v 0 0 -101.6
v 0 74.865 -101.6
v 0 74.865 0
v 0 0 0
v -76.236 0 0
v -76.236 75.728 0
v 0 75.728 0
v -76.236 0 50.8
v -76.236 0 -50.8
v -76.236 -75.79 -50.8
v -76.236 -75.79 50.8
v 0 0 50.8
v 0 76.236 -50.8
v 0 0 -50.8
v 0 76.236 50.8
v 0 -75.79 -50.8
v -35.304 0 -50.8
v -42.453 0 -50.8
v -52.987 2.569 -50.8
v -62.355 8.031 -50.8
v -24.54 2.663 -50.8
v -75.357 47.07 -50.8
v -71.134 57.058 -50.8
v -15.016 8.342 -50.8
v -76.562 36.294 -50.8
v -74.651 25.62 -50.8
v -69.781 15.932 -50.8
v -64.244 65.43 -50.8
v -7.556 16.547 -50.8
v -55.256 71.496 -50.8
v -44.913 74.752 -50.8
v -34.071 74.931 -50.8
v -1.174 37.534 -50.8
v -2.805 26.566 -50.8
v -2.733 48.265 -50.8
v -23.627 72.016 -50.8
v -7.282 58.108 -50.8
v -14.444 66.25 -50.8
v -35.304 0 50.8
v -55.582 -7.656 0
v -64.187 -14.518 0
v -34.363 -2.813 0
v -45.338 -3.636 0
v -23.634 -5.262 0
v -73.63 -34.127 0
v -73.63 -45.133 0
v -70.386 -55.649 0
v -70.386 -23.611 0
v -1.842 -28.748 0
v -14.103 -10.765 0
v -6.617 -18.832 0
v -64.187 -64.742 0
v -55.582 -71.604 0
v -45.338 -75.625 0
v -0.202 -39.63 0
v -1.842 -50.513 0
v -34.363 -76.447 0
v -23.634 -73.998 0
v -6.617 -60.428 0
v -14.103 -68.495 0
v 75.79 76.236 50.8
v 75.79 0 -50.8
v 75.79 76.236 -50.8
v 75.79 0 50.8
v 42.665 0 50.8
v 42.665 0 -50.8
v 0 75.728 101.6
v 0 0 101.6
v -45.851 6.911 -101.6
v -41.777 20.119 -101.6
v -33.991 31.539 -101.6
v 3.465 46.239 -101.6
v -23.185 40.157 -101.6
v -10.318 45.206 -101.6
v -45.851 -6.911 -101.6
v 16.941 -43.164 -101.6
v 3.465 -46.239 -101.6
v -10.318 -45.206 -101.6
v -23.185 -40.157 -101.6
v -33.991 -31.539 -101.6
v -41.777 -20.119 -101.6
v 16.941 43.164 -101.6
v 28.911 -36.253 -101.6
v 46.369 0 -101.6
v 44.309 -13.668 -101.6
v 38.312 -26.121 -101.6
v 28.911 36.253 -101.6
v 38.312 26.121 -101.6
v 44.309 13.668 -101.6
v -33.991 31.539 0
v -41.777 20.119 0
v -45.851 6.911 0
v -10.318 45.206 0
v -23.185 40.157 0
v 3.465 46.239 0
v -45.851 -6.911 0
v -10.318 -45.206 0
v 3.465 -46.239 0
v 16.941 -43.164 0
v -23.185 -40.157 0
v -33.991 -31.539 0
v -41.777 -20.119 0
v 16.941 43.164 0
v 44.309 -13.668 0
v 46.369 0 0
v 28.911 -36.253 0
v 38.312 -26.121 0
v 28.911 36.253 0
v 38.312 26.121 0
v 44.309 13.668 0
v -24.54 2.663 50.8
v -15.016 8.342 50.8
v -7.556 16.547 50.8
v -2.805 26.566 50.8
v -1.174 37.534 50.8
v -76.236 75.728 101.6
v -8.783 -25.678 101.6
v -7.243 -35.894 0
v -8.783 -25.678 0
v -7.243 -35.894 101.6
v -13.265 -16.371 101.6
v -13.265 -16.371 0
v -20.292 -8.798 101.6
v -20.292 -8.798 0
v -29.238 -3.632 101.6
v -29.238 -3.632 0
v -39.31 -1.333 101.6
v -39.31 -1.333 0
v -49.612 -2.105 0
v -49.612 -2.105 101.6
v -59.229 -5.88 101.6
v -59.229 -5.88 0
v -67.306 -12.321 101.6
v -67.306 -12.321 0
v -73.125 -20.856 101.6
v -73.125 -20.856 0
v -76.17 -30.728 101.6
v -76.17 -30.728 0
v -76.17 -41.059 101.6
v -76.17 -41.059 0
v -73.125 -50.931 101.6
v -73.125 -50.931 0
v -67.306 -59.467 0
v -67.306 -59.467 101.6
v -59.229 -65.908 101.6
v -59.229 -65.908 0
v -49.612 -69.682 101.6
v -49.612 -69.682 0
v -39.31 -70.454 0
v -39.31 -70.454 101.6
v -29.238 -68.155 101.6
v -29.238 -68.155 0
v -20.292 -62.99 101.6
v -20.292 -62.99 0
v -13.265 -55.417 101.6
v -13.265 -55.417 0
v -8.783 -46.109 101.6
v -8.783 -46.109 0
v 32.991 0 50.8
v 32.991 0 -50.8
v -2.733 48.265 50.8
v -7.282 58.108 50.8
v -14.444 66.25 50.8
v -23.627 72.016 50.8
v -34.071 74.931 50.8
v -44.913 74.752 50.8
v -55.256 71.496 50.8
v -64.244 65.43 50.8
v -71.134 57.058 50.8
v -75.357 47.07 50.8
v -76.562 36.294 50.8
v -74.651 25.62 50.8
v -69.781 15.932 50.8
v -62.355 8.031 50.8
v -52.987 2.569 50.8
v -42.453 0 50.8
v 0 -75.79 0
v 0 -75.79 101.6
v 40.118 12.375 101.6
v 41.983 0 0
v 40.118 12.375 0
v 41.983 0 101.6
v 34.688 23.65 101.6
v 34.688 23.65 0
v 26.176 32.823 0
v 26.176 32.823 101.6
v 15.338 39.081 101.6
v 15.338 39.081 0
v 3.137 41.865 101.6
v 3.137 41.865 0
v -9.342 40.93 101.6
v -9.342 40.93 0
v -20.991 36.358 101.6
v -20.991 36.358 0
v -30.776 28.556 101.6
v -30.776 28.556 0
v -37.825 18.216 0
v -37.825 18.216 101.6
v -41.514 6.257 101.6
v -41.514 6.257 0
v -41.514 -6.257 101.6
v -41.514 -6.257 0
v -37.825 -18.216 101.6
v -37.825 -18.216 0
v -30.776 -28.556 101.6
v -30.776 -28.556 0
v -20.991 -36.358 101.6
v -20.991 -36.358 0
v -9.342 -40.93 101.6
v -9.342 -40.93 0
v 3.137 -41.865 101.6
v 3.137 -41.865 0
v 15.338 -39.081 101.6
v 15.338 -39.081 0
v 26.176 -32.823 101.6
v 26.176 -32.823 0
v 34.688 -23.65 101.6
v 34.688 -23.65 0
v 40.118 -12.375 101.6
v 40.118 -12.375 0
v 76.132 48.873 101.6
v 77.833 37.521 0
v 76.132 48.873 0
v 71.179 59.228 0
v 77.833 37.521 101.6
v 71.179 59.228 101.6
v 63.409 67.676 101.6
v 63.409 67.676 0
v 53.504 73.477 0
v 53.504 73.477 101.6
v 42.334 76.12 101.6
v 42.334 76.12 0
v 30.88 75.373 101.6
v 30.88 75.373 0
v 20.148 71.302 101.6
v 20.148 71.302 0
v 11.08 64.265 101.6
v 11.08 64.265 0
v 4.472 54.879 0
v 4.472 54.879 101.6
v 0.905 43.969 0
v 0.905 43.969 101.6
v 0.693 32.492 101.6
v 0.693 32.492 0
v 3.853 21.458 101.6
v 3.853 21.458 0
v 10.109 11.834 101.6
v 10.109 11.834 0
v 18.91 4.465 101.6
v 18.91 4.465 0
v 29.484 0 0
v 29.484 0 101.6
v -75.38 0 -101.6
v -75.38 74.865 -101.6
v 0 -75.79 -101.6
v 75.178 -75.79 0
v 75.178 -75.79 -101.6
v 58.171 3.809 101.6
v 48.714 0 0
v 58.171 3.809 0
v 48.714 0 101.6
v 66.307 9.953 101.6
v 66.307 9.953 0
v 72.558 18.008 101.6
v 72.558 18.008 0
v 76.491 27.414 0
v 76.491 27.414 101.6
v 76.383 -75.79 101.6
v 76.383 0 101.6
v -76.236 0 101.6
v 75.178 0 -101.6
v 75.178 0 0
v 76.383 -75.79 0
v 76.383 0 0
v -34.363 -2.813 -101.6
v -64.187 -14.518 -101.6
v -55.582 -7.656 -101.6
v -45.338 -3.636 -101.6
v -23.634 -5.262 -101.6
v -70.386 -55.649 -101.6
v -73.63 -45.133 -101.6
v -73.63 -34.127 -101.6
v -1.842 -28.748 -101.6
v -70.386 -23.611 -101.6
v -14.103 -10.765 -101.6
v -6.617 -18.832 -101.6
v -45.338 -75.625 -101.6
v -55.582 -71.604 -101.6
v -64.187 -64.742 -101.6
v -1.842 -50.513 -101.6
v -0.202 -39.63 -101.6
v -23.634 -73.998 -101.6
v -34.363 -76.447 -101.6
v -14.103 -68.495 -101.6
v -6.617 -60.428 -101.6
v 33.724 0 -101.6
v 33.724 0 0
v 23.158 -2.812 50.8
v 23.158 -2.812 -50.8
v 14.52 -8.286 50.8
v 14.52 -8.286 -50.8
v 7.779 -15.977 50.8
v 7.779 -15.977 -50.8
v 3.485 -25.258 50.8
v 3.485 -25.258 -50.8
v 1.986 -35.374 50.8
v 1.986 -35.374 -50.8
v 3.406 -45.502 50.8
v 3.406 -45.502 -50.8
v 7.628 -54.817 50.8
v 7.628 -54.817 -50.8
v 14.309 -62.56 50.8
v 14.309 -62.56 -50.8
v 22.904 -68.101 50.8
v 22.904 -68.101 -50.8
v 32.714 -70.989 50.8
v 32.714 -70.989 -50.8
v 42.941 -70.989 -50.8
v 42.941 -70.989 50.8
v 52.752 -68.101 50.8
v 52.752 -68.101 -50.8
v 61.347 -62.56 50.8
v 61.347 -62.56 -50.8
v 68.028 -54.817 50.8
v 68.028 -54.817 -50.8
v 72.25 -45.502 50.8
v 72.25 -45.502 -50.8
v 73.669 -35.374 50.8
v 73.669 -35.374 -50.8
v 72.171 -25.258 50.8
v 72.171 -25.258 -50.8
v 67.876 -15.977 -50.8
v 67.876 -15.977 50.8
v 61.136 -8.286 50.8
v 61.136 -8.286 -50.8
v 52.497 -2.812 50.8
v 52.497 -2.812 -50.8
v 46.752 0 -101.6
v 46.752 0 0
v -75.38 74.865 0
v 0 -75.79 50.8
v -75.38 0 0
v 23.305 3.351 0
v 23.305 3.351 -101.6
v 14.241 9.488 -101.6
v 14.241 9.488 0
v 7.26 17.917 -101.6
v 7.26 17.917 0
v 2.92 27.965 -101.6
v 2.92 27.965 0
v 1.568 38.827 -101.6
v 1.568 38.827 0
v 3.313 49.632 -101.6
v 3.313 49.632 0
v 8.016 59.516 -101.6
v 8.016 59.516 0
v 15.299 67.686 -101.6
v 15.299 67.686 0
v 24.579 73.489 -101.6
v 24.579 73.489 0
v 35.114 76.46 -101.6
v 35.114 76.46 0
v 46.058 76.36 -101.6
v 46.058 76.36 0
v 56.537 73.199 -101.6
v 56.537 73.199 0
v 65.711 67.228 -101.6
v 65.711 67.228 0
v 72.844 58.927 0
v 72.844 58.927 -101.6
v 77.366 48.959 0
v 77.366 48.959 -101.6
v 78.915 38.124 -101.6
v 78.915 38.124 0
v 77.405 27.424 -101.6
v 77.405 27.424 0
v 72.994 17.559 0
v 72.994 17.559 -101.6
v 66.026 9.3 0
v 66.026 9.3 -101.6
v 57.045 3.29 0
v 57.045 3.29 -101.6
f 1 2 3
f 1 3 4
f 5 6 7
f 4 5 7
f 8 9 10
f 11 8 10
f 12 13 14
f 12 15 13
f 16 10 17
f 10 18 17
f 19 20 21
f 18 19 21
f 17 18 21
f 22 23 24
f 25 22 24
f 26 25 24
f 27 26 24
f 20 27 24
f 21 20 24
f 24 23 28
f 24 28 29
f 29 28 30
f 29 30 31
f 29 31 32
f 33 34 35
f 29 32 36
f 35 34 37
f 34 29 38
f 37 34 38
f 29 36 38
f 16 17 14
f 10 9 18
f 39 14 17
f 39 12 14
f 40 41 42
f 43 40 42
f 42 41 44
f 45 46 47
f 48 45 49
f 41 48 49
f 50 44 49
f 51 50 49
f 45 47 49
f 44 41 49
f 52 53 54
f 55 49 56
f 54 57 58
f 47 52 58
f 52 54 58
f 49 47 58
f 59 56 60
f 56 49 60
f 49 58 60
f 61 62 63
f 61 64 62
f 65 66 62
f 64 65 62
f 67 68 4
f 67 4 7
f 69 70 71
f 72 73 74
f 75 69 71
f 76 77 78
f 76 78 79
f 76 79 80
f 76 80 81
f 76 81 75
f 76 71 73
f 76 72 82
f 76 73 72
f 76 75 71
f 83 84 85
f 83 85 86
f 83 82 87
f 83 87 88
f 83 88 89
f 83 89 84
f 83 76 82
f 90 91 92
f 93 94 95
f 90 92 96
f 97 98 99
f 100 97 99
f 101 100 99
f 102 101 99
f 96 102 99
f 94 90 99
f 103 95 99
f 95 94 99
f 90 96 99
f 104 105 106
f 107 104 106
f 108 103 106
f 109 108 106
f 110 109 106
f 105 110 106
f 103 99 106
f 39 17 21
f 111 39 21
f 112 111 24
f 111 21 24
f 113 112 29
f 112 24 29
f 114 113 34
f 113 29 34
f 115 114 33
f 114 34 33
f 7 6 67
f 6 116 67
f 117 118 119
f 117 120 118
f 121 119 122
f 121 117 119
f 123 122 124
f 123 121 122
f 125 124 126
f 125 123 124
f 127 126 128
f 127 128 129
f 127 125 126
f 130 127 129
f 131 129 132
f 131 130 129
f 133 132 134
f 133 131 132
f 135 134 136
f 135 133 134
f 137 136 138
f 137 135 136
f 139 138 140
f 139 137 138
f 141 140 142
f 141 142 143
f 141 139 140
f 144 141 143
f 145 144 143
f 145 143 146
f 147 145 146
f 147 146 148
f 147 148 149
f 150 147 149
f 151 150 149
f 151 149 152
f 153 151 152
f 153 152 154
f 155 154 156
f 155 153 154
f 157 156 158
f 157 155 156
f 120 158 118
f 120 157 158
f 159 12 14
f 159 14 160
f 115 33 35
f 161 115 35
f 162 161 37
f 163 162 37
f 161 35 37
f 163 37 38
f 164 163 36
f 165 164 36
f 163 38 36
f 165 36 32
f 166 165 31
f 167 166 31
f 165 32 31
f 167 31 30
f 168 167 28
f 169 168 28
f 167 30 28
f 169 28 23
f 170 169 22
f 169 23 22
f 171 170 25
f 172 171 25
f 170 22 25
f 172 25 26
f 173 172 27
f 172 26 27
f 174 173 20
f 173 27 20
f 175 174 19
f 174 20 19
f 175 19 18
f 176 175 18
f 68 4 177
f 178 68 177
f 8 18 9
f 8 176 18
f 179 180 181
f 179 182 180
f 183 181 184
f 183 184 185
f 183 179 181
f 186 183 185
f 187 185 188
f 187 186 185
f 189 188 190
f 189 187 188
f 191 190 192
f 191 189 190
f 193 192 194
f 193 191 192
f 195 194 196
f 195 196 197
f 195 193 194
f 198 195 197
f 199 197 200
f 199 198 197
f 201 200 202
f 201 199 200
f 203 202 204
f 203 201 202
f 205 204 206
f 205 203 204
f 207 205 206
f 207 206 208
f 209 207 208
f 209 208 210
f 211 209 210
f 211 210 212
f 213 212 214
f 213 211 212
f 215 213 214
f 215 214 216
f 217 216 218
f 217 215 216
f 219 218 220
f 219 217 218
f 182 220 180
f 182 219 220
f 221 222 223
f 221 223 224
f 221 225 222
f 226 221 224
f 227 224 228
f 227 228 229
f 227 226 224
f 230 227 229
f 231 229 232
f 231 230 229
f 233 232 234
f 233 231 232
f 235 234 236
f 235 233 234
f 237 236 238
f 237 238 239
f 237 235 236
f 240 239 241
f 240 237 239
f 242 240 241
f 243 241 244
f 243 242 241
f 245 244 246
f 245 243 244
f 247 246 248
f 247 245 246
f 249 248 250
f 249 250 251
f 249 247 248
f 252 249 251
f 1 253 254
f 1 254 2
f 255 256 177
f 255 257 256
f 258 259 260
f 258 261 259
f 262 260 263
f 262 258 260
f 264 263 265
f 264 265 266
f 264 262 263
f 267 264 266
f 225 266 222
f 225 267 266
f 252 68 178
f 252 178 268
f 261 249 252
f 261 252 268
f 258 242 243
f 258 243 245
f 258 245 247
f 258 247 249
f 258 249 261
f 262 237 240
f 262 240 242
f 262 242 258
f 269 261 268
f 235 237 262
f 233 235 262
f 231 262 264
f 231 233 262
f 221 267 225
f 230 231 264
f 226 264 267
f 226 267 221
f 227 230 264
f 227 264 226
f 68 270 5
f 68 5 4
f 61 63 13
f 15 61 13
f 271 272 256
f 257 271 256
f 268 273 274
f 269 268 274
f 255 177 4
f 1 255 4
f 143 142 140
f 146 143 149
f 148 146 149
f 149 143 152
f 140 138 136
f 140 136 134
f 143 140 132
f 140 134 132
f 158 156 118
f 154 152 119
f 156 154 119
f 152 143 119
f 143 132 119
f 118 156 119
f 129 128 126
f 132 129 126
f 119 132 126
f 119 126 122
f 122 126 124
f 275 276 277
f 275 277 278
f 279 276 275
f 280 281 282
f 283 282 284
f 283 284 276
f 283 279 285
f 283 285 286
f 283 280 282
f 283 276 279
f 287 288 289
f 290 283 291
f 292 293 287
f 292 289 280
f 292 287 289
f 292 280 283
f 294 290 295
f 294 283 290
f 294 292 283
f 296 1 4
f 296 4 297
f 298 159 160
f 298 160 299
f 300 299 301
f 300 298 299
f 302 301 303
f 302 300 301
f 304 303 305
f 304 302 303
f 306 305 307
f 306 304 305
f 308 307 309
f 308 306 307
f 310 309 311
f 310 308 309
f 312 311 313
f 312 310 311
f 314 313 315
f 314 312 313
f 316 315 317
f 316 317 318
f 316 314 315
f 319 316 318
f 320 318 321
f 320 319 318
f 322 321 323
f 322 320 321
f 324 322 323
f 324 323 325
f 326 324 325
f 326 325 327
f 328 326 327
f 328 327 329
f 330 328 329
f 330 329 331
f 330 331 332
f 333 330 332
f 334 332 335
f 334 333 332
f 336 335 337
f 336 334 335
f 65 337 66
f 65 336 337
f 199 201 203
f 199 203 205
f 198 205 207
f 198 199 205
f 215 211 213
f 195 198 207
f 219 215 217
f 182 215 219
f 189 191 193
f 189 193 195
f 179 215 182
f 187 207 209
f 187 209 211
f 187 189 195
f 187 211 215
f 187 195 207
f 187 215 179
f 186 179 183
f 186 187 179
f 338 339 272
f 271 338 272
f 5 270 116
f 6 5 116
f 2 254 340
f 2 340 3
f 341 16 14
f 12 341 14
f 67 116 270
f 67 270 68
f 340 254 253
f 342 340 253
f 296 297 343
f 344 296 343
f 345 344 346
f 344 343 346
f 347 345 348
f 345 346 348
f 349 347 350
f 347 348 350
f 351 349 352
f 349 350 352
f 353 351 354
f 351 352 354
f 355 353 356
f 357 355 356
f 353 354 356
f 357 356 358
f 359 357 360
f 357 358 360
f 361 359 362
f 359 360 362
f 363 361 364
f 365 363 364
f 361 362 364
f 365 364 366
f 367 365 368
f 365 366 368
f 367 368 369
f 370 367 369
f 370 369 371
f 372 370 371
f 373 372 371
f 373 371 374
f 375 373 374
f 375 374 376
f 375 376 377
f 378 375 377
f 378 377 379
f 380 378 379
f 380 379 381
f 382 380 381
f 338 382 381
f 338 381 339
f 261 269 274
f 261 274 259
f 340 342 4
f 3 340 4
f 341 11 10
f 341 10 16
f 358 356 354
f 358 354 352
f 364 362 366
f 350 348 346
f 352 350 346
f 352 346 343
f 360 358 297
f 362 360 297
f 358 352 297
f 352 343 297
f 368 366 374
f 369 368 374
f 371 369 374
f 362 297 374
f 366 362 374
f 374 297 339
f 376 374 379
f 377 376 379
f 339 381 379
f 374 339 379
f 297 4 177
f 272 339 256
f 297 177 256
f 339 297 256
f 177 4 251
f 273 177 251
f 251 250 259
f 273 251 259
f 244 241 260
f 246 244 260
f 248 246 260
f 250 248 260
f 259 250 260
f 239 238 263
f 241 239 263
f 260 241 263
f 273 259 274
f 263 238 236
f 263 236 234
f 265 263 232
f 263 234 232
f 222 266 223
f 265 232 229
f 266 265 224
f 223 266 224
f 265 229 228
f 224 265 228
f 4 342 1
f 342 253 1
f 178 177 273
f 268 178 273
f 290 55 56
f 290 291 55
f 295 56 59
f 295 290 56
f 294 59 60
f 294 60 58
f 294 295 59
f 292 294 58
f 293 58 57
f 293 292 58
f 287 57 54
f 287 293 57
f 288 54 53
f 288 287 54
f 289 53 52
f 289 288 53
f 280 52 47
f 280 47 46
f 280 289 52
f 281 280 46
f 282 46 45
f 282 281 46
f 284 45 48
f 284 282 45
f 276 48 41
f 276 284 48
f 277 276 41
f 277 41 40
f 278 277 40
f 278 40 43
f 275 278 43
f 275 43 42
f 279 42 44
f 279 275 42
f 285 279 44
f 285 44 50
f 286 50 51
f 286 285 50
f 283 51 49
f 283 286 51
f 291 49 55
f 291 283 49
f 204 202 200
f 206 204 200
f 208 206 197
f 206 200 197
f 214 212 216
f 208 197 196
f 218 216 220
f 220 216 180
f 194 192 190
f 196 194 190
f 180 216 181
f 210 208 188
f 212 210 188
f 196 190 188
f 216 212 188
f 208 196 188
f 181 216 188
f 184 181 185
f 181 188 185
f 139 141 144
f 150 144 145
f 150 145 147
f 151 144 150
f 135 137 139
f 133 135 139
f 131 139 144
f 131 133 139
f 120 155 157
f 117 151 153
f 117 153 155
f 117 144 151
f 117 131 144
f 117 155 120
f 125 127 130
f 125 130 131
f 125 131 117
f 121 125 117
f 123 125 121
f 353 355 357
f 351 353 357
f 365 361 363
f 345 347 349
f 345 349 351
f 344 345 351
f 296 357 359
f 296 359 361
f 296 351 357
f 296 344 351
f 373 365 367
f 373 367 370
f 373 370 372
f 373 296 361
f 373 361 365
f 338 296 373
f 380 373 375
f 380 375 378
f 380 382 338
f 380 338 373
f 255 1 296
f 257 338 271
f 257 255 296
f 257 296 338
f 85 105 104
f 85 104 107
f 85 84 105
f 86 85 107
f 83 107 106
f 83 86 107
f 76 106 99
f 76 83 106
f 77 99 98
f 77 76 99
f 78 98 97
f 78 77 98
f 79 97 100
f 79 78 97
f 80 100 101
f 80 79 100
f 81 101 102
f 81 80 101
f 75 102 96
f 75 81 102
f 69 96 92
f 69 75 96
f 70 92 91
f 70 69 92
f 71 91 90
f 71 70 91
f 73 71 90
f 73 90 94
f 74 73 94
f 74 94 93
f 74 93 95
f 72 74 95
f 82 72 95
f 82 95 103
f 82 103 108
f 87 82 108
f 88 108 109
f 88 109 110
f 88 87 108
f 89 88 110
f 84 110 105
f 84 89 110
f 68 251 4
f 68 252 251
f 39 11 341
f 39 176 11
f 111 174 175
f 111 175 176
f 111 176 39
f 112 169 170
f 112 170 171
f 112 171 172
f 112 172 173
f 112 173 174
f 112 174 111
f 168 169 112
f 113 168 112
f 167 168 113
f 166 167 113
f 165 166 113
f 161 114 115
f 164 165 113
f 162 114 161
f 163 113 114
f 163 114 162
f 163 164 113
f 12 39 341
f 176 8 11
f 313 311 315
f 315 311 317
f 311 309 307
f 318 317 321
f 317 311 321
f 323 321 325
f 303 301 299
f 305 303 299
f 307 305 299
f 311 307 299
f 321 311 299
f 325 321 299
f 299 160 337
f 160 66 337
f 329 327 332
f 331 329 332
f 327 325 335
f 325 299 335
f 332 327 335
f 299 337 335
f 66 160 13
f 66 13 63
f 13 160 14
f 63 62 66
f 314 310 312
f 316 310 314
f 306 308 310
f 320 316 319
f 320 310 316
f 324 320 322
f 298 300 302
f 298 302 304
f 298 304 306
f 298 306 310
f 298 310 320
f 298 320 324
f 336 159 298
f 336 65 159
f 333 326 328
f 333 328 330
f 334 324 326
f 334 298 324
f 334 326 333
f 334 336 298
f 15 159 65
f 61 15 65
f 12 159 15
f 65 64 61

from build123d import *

# Parameters (mm, degrees)
F1_DEPTH = 50.8
F2_R     = 41.9827329892
F3_DEPTH = 50.8
F4_R     = 46.3690450782
F5_DEPTH = 50.8
F6_W     = 76.2355700135
F6_H     = 75.7283642888
F7_DEPTH = 50.8
F6_R     = 34.657295951
F8_W     = 75.3795877099
F8_H     = 74.8647451401
F9_DEPTH = 50.8
F8_R     = 36.9201585183


with BuildPart() as f1:
    # F0 (on Top) → F1 (new body, symmetric)
    with BuildSketch(Plane.XY):
        with BuildLine():
            Line((-76.2355700135, 0), (-76.2355700135, -75.7897570729))
            Line((-76.2355700135, -75.7897570729), (0, -75.7897570729))
            Line((0, -75.7897570729), (0, 0))
            Line((0, 0), (-35.3039363166, 0))
            ThreePointArc((-35.3039363166, 0), (-38.8783067636, -0.1698086305), (-42.4526772107, 0))
            Line((-42.4526772107, 0), (-76.2355700135, 0))
        make_face()
        with BuildLine():
            ThreePointArc((-1.174218853, 37.5342792802), (-64.2439318064, 65.430216464), (-42.4526772107, 0))
            Line((-42.4526772107, 0), (-35.3039363166, 0))
            ThreePointArc((-35.3039363166, 0), (-10.9823695798, 12.1686542375), (-1.174218853, 37.5342792802))
        make_face()
        with BuildLine():
            Line((-35.3039363166, 0), (-42.4526772107, 0))
            ThreePointArc((-42.4526772107, 0), (-38.8783067636, -0.1698086305), (-35.3039363166, 0))
        make_face()
    extrude(amount=F1_DEPTH, both=True)


with BuildPart() as f1b:
    # F0 (on Top) → F1, piece 2 (new body, symmetric)
    with BuildSketch(Plane.XY):
        with BuildLine():
            Line((0, 76.2355700135), (0, 0))
            Line((0, 0), (32.9908393323, 0))
            ThreePointArc((32.9908393323, 0), (37.8278076863, 0.327882624), (42.6647760403, 0))
            Line((42.6647760403, 0), (75.7897570729, 0))
            Line((75.7897570729, 0), (75.7897570729, 76.2355700135))
            Line((75.7897570729, 76.2355700135), (0, 76.2355700135))
        make_face()
        with BuildLine():
            ThreePointArc((42.6647760403, 0), (37.8278076863, 0.327882624), (32.9908393323, 0))
            Line((32.9908393323, 0), (42.6647760403, 0))
        make_face()
        with BuildLine():
            Line((42.6647760403, 0), (32.9908393323, 0))
            ThreePointArc((32.9908393323, 0), (14.2559473008, -62.5138235869), (73.6695512762, -35.513860966))
            ThreePointArc((73.6695512762, -35.513860966), (64.8277703072, -11.9420005804), (42.6647760403, 0))
        make_face()
    extrude(amount=F1_DEPTH, both=True)


with BuildPart() as f3:
    # F2 (on face) → F3 (new body, symmetric)
    with BuildSketch(Plane.XY.offset(50.8)):
        Circle(F2_R)
    extrude(amount=F3_DEPTH, both=True)


with BuildPart() as f5:
    # F4 (on face) → F5 (new body, symmetric)
    with BuildSketch(Plane(origin=(0, 0, -50.8), x_dir=(1, 0, 0), z_dir=(0, 0, -1))):
        Circle(F4_R)
    extrude(amount=F5_DEPTH, both=True)


with BuildPart() as f7:
    # F6 (on face) → F7 (new body, symmetric)
    with BuildSketch(Plane.XY.offset(50.8)):
        with Locations((-38.1177850068, 37.8641821444)):
            Rectangle(F6_W, F6_H)
    extrude(amount=F7_DEPTH, both=True)


with BuildPart() as f7b:
    # F6 (on face) → F7, piece 2 (new body, symmetric)
    with BuildSketch(Plane.XY.offset(50.8)):
        with BuildLine():
            Line((29.4839675583, 0), (0, 0))
            Line((0, 0), (0, -75.7897570729))
            Line((0, -75.7897570729), (76.3831436634, -75.7897570729))
            Line((76.3831436634, -75.7897570729), (76.3831436634, 0))
            Line((76.3831436634, 0), (48.7136638882, 0))
            ThreePointArc((48.7136638882, 0), (39.0988157233, -1.2123166643), (29.4839675583, 0))
        make_face()
        with BuildLine():
            ThreePointArc((77.8325144727, 37.5213820851), (15.3513865312, 68.1213661631), (29.4839675583, 0))
            Line((29.4839675583, 0), (48.7136638882, 0))
            ThreePointArc((48.7136638882, 0), (69.6987998013, 13.773952893), (77.8325144727, 37.5213820851))
        make_face()
        with BuildLine():
            Line((48.7136638882, 0), (29.4839675583, 0))
            ThreePointArc((29.4839675583, 0), (39.0988157233, -1.2123166643), (48.7136638882, 0))
        make_face()
    extrude(amount=F7_DEPTH, both=True)


with BuildPart() as f7c:
    # F6 (on face) → F7, piece 3 (new body, symmetric)
    with BuildSketch(Plane.XY.offset(50.8)):
        with Locations((-41.9001344524, -35.893687272)):
            Circle(F6_R)
    extrude(amount=F7_DEPTH, both=True)


with BuildPart() as f9:
    # F8 (on face) → F9 (new body, symmetric)
    with BuildSketch(Plane(origin=(0, 0, -50.8), x_dir=(1, 0, 0), z_dir=(0, 0, -1))):
        with Locations((-37.689793855, -37.43237257)):
            Rectangle(F8_W, F8_H)
    extrude(amount=F9_DEPTH, both=True)


with BuildPart() as f9b:
    # F8 (on face) → F9, piece 2 (new body, symmetric)
    with BuildSketch(Plane(origin=(0, 0, -50.8), x_dir=(1, 0, 0), z_dir=(0, 0, -1))):
        with BuildLine():
            Line((0, 75.7897570729), (0, 0))
            Line((0, 0), (33.7242558599, 0))
            ThreePointArc((33.7242558599, 0), (40.2381688994, 0.5524818444), (46.752081939, 0))
            Line((46.752081939, 0), (75.1779526472, 0))
            Line((75.1779526472, 0), (75.1779526472, 75.7897570729))
            Line((75.1779526472, 75.7897570729), (0, 75.7897570729))
        make_face()
        with BuildLine():
            ThreePointArc((46.752081939, 0), (40.2381688994, 0.5524818444), (33.7242558599, 0))
            Line((33.7242558599, 0), (46.752081939, 0))
        make_face()
        with BuildLine():
            Line((46.752081939, 0), (33.7242558599, 0))
            ThreePointArc((33.7242558599, 0), (15.2987696707, -67.6861418797), (78.9148238023, -38.1241730585))
            ThreePointArc((78.9148238023, -38.1241730585), (69.8001377207, -13.1847738297), (46.752081939, 0))
        make_face()
    extrude(amount=F9_DEPTH, both=True)


with BuildPart() as f9c:
    # F8 (on face) → F9, piece 3 (new body, symmetric)
    with BuildSketch(Plane(origin=(0, 0, -50.8), x_dir=(1, 0, 0), z_dir=(0, 0, -1))):
        with Locations((-37.122128104, 39.6301070985)):
            Circle(F8_R)
    extrude(amount=F9_DEPTH, both=True)


solid = Compound([f1.part, f1b.part, f3.part, f5.part, f7.part, f7b.part, f7c.part, f9.part, f9b.part, f9c.part])
